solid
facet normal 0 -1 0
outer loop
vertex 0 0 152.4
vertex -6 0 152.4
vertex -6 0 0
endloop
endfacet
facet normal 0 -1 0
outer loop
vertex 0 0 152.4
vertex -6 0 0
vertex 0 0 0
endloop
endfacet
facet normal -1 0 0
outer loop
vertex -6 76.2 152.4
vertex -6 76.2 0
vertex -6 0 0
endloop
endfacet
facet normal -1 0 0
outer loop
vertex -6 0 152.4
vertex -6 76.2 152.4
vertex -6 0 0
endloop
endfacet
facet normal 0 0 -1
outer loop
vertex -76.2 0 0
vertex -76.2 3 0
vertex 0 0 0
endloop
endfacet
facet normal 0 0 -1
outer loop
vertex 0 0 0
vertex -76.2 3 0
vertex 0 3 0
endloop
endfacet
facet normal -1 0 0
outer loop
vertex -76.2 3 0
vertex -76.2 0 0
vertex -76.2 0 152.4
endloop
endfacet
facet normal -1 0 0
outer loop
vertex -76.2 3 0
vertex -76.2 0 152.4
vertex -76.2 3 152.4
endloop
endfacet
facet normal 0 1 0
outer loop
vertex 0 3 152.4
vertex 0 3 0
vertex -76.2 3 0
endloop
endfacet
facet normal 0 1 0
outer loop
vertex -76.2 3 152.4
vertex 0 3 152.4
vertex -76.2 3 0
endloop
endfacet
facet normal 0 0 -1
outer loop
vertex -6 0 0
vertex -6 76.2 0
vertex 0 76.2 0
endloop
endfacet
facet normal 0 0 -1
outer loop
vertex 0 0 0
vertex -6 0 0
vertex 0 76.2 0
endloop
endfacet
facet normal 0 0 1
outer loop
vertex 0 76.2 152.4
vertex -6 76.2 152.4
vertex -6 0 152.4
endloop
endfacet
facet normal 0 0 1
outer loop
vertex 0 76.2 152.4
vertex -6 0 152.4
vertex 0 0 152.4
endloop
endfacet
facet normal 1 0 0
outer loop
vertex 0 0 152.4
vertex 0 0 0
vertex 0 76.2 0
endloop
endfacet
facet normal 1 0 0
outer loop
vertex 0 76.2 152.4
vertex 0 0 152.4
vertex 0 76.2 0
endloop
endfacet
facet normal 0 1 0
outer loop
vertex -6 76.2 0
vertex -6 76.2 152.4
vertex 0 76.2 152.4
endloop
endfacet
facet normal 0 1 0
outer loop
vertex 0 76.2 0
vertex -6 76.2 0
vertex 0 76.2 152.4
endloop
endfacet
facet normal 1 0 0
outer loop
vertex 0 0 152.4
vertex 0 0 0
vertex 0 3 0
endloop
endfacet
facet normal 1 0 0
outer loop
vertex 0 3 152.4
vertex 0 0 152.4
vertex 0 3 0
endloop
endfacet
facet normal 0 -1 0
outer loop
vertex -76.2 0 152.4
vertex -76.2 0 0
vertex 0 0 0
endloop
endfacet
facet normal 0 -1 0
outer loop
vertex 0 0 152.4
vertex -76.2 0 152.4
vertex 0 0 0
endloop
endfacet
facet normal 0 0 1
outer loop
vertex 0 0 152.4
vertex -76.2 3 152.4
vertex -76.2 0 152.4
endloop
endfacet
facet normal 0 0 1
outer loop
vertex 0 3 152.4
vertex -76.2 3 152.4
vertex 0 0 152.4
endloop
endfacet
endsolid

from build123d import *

# Parameters (mm, degrees)
F0_W     = 6
F0_H     = 3
F0_W_2   = 70.2
F1_DEPTH = 152.4
F0_H_2   = 73.2
F2_DEPTH = 152.4


with BuildPart() as f1:
    # F0 (on Top) → F1 (new body)
    with BuildSketch(Plane.XY):
        with Locations((-3, 1.5)):
            Rectangle(F0_W, F0_H)
        with Locations((-41.1, 1.5)):
            Rectangle(F0_W_2, F0_H)
    extrude(amount=F1_DEPTH)


with BuildPart() as f2:
    # F0 (on Top) → F2 (new body)
    with BuildSketch(Plane.XY):
        with Locations((-3, 39.6)):
            Rectangle(F0_W, F0_H_2)
        with Locations((-3, 1.5)):
            Rectangle(F0_W, F0_H)
    extrude(amount=F2_DEPTH)


solid = Compound([f1.part, f2.part])
